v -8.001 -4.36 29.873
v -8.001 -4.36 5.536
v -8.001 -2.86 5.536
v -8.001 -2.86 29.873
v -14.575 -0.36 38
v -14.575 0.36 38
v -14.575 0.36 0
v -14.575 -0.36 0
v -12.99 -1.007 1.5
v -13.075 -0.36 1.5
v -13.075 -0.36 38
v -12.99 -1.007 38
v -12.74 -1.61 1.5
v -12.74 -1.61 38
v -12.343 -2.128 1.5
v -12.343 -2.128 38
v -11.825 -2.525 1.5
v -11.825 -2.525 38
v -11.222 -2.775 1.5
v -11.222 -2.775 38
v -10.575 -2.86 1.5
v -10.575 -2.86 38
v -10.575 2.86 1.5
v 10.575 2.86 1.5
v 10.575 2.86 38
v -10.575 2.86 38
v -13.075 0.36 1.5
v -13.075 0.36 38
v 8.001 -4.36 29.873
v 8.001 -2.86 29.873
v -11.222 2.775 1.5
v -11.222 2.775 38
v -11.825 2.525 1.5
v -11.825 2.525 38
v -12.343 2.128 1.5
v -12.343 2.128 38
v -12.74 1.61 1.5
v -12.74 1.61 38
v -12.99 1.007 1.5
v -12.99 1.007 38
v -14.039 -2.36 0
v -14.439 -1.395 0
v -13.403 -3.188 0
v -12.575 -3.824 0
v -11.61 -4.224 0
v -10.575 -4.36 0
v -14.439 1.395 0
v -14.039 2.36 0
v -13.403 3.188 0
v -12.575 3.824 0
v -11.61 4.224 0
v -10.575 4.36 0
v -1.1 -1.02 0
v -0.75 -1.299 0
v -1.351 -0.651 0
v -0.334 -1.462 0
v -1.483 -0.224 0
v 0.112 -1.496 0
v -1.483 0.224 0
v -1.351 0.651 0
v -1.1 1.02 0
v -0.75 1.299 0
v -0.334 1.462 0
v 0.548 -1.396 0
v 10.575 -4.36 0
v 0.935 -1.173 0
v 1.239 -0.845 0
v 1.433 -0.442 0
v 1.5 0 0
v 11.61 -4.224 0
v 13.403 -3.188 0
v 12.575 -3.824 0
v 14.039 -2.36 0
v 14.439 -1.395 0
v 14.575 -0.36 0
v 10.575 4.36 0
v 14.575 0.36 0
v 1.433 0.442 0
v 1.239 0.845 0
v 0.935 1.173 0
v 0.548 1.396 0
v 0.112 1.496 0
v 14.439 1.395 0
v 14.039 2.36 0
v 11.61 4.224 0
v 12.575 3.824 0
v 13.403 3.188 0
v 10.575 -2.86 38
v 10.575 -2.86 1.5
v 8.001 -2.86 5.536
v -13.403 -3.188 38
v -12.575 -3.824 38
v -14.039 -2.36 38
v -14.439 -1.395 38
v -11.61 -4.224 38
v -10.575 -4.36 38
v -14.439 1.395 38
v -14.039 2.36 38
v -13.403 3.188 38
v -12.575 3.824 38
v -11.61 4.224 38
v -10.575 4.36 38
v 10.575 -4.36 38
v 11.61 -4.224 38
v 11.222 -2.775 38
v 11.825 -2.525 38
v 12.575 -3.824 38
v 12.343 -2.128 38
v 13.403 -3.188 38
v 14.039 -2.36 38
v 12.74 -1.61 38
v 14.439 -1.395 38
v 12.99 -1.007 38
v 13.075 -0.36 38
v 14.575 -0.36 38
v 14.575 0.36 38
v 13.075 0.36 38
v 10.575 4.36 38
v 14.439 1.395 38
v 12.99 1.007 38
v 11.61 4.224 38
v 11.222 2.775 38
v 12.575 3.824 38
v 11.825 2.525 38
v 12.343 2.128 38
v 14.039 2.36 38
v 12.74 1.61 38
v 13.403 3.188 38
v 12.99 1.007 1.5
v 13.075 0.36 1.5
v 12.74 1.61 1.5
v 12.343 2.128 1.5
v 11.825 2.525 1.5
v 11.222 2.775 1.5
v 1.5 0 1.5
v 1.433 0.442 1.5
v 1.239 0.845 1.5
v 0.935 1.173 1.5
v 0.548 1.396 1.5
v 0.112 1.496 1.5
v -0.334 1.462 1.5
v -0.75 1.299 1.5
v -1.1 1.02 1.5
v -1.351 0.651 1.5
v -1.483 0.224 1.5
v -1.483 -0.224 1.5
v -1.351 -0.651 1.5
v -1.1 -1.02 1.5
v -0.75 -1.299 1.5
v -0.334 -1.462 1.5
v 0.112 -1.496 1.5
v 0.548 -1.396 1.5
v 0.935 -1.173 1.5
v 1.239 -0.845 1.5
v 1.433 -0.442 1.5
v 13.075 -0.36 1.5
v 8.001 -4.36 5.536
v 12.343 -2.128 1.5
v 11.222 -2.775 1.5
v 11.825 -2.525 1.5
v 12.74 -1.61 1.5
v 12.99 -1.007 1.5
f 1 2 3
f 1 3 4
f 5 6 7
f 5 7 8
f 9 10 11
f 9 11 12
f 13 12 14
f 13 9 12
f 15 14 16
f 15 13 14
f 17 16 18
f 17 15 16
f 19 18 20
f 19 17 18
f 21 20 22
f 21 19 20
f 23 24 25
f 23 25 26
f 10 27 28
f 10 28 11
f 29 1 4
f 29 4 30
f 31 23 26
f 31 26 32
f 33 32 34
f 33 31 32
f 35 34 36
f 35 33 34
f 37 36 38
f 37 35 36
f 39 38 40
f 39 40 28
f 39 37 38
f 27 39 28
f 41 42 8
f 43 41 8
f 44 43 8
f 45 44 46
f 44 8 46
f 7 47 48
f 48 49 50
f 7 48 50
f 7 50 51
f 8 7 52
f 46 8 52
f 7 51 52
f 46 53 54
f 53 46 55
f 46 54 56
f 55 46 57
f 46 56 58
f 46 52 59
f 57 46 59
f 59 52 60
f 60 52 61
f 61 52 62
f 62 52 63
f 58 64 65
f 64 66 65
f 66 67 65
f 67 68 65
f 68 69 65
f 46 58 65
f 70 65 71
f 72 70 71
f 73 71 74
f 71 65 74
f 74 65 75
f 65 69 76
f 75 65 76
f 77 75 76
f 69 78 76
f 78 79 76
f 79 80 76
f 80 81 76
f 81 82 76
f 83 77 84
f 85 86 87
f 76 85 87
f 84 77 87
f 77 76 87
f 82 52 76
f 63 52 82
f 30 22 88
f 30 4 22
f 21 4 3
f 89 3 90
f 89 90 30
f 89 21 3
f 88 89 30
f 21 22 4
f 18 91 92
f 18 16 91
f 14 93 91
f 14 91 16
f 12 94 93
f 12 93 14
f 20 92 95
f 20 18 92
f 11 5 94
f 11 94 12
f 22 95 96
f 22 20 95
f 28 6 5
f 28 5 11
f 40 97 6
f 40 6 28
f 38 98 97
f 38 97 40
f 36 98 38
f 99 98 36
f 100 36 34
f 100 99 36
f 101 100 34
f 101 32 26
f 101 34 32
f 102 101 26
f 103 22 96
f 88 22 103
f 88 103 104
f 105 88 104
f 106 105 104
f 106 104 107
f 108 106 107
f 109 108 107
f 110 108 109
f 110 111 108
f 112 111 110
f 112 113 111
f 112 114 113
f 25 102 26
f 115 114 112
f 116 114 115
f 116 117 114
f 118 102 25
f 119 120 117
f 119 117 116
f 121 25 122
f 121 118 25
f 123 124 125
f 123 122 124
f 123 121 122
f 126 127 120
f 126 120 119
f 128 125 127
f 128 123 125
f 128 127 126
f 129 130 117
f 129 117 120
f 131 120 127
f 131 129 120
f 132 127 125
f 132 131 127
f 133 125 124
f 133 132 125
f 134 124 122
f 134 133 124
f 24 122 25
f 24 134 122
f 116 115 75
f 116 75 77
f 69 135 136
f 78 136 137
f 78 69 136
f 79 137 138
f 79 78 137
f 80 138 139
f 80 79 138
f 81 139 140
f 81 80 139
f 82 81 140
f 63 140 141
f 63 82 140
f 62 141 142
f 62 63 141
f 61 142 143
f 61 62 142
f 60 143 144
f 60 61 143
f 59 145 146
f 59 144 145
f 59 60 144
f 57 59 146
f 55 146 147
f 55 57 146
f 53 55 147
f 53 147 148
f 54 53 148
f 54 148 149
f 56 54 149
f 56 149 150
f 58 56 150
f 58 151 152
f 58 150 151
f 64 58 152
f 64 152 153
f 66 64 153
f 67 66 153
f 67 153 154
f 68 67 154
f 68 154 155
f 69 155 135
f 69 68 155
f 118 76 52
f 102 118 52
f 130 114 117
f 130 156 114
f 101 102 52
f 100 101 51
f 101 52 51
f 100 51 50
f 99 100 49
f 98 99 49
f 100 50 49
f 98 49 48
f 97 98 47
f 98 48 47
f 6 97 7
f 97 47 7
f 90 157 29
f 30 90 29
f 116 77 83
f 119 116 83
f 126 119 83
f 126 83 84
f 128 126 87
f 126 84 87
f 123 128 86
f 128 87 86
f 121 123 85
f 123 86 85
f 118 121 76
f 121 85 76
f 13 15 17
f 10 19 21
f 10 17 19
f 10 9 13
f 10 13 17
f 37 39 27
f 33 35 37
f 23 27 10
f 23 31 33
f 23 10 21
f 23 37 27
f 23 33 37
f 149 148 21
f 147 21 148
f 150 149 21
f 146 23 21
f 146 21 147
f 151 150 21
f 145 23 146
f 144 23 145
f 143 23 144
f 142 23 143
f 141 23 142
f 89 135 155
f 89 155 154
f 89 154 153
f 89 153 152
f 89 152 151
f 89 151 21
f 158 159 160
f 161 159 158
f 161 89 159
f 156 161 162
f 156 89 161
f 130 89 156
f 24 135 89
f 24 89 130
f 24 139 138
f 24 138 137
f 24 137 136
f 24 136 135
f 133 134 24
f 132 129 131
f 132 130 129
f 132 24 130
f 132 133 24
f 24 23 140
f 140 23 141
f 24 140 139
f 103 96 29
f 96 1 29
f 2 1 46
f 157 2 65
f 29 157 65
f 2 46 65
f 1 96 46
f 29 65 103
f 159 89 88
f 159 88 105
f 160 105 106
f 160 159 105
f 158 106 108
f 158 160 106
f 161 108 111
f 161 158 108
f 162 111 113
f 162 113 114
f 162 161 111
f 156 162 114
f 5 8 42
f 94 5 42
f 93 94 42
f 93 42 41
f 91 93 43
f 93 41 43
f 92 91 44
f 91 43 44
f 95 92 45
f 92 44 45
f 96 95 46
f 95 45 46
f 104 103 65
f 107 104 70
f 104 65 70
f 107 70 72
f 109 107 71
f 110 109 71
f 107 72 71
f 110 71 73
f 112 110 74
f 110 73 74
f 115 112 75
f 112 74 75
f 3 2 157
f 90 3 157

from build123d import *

# Parameters (mm, degrees)
F1_DEPTH = 38
F2_T     = -1.5
F3_R     = 1.5
F4_DEPTH = 25
F5_W     = 16.002862
F5_H     = 24.337668
F6_DEPTH = 3


with BuildPart() as f1:
    # F0 (on Top) → F1 (new body)
    with BuildSketch(Plane.XY):
        with BuildLine():
            ThreePointArc((14.575, 0.36), (13.403427, 3.188427), (10.575, 4.36))
            Line((10.575, 4.36), (-10.575, 4.36))
            ThreePointArc((-10.575, 4.36), (-13.403427, 3.188427), (-14.575, 0.36))
            Line((-14.575, 0.36), (-14.575, -0.36))
            ThreePointArc((-14.575, -0.36), (-13.403427, -3.188427), (-10.575, -4.36))
            Line((-10.575, -4.36), (10.575, -4.36))
            ThreePointArc((10.575, -4.36), (13.403427, -3.188427), (14.575, -0.36))
            Line((14.575, -0.36), (14.575, 0.36))
        make_face()
    extrude(amount=F1_DEPTH)

    # F2
    f2_openings = [f1.faces().sort_by_distance(p)[0] for p in [
        (0, 0, 38),
    ]]
    offset(amount=F2_T, openings=f2_openings)

    # F3 (on Top) → F4 (cut)
    with BuildSketch(Plane.XY):
        Circle(F3_R)
    extrude(amount=F4_DEPTH, mode=Mode.SUBTRACT)

    # F5 (on face) → F6 (cut)
    with BuildSketch(Plane.XZ.offset(4.36)):
        with Locations((0, 17.704612)):
            Rectangle(F5_W, F5_H)
    extrude(amount=-F6_DEPTH, mode=Mode.SUBTRACT)


solid = f1.part
